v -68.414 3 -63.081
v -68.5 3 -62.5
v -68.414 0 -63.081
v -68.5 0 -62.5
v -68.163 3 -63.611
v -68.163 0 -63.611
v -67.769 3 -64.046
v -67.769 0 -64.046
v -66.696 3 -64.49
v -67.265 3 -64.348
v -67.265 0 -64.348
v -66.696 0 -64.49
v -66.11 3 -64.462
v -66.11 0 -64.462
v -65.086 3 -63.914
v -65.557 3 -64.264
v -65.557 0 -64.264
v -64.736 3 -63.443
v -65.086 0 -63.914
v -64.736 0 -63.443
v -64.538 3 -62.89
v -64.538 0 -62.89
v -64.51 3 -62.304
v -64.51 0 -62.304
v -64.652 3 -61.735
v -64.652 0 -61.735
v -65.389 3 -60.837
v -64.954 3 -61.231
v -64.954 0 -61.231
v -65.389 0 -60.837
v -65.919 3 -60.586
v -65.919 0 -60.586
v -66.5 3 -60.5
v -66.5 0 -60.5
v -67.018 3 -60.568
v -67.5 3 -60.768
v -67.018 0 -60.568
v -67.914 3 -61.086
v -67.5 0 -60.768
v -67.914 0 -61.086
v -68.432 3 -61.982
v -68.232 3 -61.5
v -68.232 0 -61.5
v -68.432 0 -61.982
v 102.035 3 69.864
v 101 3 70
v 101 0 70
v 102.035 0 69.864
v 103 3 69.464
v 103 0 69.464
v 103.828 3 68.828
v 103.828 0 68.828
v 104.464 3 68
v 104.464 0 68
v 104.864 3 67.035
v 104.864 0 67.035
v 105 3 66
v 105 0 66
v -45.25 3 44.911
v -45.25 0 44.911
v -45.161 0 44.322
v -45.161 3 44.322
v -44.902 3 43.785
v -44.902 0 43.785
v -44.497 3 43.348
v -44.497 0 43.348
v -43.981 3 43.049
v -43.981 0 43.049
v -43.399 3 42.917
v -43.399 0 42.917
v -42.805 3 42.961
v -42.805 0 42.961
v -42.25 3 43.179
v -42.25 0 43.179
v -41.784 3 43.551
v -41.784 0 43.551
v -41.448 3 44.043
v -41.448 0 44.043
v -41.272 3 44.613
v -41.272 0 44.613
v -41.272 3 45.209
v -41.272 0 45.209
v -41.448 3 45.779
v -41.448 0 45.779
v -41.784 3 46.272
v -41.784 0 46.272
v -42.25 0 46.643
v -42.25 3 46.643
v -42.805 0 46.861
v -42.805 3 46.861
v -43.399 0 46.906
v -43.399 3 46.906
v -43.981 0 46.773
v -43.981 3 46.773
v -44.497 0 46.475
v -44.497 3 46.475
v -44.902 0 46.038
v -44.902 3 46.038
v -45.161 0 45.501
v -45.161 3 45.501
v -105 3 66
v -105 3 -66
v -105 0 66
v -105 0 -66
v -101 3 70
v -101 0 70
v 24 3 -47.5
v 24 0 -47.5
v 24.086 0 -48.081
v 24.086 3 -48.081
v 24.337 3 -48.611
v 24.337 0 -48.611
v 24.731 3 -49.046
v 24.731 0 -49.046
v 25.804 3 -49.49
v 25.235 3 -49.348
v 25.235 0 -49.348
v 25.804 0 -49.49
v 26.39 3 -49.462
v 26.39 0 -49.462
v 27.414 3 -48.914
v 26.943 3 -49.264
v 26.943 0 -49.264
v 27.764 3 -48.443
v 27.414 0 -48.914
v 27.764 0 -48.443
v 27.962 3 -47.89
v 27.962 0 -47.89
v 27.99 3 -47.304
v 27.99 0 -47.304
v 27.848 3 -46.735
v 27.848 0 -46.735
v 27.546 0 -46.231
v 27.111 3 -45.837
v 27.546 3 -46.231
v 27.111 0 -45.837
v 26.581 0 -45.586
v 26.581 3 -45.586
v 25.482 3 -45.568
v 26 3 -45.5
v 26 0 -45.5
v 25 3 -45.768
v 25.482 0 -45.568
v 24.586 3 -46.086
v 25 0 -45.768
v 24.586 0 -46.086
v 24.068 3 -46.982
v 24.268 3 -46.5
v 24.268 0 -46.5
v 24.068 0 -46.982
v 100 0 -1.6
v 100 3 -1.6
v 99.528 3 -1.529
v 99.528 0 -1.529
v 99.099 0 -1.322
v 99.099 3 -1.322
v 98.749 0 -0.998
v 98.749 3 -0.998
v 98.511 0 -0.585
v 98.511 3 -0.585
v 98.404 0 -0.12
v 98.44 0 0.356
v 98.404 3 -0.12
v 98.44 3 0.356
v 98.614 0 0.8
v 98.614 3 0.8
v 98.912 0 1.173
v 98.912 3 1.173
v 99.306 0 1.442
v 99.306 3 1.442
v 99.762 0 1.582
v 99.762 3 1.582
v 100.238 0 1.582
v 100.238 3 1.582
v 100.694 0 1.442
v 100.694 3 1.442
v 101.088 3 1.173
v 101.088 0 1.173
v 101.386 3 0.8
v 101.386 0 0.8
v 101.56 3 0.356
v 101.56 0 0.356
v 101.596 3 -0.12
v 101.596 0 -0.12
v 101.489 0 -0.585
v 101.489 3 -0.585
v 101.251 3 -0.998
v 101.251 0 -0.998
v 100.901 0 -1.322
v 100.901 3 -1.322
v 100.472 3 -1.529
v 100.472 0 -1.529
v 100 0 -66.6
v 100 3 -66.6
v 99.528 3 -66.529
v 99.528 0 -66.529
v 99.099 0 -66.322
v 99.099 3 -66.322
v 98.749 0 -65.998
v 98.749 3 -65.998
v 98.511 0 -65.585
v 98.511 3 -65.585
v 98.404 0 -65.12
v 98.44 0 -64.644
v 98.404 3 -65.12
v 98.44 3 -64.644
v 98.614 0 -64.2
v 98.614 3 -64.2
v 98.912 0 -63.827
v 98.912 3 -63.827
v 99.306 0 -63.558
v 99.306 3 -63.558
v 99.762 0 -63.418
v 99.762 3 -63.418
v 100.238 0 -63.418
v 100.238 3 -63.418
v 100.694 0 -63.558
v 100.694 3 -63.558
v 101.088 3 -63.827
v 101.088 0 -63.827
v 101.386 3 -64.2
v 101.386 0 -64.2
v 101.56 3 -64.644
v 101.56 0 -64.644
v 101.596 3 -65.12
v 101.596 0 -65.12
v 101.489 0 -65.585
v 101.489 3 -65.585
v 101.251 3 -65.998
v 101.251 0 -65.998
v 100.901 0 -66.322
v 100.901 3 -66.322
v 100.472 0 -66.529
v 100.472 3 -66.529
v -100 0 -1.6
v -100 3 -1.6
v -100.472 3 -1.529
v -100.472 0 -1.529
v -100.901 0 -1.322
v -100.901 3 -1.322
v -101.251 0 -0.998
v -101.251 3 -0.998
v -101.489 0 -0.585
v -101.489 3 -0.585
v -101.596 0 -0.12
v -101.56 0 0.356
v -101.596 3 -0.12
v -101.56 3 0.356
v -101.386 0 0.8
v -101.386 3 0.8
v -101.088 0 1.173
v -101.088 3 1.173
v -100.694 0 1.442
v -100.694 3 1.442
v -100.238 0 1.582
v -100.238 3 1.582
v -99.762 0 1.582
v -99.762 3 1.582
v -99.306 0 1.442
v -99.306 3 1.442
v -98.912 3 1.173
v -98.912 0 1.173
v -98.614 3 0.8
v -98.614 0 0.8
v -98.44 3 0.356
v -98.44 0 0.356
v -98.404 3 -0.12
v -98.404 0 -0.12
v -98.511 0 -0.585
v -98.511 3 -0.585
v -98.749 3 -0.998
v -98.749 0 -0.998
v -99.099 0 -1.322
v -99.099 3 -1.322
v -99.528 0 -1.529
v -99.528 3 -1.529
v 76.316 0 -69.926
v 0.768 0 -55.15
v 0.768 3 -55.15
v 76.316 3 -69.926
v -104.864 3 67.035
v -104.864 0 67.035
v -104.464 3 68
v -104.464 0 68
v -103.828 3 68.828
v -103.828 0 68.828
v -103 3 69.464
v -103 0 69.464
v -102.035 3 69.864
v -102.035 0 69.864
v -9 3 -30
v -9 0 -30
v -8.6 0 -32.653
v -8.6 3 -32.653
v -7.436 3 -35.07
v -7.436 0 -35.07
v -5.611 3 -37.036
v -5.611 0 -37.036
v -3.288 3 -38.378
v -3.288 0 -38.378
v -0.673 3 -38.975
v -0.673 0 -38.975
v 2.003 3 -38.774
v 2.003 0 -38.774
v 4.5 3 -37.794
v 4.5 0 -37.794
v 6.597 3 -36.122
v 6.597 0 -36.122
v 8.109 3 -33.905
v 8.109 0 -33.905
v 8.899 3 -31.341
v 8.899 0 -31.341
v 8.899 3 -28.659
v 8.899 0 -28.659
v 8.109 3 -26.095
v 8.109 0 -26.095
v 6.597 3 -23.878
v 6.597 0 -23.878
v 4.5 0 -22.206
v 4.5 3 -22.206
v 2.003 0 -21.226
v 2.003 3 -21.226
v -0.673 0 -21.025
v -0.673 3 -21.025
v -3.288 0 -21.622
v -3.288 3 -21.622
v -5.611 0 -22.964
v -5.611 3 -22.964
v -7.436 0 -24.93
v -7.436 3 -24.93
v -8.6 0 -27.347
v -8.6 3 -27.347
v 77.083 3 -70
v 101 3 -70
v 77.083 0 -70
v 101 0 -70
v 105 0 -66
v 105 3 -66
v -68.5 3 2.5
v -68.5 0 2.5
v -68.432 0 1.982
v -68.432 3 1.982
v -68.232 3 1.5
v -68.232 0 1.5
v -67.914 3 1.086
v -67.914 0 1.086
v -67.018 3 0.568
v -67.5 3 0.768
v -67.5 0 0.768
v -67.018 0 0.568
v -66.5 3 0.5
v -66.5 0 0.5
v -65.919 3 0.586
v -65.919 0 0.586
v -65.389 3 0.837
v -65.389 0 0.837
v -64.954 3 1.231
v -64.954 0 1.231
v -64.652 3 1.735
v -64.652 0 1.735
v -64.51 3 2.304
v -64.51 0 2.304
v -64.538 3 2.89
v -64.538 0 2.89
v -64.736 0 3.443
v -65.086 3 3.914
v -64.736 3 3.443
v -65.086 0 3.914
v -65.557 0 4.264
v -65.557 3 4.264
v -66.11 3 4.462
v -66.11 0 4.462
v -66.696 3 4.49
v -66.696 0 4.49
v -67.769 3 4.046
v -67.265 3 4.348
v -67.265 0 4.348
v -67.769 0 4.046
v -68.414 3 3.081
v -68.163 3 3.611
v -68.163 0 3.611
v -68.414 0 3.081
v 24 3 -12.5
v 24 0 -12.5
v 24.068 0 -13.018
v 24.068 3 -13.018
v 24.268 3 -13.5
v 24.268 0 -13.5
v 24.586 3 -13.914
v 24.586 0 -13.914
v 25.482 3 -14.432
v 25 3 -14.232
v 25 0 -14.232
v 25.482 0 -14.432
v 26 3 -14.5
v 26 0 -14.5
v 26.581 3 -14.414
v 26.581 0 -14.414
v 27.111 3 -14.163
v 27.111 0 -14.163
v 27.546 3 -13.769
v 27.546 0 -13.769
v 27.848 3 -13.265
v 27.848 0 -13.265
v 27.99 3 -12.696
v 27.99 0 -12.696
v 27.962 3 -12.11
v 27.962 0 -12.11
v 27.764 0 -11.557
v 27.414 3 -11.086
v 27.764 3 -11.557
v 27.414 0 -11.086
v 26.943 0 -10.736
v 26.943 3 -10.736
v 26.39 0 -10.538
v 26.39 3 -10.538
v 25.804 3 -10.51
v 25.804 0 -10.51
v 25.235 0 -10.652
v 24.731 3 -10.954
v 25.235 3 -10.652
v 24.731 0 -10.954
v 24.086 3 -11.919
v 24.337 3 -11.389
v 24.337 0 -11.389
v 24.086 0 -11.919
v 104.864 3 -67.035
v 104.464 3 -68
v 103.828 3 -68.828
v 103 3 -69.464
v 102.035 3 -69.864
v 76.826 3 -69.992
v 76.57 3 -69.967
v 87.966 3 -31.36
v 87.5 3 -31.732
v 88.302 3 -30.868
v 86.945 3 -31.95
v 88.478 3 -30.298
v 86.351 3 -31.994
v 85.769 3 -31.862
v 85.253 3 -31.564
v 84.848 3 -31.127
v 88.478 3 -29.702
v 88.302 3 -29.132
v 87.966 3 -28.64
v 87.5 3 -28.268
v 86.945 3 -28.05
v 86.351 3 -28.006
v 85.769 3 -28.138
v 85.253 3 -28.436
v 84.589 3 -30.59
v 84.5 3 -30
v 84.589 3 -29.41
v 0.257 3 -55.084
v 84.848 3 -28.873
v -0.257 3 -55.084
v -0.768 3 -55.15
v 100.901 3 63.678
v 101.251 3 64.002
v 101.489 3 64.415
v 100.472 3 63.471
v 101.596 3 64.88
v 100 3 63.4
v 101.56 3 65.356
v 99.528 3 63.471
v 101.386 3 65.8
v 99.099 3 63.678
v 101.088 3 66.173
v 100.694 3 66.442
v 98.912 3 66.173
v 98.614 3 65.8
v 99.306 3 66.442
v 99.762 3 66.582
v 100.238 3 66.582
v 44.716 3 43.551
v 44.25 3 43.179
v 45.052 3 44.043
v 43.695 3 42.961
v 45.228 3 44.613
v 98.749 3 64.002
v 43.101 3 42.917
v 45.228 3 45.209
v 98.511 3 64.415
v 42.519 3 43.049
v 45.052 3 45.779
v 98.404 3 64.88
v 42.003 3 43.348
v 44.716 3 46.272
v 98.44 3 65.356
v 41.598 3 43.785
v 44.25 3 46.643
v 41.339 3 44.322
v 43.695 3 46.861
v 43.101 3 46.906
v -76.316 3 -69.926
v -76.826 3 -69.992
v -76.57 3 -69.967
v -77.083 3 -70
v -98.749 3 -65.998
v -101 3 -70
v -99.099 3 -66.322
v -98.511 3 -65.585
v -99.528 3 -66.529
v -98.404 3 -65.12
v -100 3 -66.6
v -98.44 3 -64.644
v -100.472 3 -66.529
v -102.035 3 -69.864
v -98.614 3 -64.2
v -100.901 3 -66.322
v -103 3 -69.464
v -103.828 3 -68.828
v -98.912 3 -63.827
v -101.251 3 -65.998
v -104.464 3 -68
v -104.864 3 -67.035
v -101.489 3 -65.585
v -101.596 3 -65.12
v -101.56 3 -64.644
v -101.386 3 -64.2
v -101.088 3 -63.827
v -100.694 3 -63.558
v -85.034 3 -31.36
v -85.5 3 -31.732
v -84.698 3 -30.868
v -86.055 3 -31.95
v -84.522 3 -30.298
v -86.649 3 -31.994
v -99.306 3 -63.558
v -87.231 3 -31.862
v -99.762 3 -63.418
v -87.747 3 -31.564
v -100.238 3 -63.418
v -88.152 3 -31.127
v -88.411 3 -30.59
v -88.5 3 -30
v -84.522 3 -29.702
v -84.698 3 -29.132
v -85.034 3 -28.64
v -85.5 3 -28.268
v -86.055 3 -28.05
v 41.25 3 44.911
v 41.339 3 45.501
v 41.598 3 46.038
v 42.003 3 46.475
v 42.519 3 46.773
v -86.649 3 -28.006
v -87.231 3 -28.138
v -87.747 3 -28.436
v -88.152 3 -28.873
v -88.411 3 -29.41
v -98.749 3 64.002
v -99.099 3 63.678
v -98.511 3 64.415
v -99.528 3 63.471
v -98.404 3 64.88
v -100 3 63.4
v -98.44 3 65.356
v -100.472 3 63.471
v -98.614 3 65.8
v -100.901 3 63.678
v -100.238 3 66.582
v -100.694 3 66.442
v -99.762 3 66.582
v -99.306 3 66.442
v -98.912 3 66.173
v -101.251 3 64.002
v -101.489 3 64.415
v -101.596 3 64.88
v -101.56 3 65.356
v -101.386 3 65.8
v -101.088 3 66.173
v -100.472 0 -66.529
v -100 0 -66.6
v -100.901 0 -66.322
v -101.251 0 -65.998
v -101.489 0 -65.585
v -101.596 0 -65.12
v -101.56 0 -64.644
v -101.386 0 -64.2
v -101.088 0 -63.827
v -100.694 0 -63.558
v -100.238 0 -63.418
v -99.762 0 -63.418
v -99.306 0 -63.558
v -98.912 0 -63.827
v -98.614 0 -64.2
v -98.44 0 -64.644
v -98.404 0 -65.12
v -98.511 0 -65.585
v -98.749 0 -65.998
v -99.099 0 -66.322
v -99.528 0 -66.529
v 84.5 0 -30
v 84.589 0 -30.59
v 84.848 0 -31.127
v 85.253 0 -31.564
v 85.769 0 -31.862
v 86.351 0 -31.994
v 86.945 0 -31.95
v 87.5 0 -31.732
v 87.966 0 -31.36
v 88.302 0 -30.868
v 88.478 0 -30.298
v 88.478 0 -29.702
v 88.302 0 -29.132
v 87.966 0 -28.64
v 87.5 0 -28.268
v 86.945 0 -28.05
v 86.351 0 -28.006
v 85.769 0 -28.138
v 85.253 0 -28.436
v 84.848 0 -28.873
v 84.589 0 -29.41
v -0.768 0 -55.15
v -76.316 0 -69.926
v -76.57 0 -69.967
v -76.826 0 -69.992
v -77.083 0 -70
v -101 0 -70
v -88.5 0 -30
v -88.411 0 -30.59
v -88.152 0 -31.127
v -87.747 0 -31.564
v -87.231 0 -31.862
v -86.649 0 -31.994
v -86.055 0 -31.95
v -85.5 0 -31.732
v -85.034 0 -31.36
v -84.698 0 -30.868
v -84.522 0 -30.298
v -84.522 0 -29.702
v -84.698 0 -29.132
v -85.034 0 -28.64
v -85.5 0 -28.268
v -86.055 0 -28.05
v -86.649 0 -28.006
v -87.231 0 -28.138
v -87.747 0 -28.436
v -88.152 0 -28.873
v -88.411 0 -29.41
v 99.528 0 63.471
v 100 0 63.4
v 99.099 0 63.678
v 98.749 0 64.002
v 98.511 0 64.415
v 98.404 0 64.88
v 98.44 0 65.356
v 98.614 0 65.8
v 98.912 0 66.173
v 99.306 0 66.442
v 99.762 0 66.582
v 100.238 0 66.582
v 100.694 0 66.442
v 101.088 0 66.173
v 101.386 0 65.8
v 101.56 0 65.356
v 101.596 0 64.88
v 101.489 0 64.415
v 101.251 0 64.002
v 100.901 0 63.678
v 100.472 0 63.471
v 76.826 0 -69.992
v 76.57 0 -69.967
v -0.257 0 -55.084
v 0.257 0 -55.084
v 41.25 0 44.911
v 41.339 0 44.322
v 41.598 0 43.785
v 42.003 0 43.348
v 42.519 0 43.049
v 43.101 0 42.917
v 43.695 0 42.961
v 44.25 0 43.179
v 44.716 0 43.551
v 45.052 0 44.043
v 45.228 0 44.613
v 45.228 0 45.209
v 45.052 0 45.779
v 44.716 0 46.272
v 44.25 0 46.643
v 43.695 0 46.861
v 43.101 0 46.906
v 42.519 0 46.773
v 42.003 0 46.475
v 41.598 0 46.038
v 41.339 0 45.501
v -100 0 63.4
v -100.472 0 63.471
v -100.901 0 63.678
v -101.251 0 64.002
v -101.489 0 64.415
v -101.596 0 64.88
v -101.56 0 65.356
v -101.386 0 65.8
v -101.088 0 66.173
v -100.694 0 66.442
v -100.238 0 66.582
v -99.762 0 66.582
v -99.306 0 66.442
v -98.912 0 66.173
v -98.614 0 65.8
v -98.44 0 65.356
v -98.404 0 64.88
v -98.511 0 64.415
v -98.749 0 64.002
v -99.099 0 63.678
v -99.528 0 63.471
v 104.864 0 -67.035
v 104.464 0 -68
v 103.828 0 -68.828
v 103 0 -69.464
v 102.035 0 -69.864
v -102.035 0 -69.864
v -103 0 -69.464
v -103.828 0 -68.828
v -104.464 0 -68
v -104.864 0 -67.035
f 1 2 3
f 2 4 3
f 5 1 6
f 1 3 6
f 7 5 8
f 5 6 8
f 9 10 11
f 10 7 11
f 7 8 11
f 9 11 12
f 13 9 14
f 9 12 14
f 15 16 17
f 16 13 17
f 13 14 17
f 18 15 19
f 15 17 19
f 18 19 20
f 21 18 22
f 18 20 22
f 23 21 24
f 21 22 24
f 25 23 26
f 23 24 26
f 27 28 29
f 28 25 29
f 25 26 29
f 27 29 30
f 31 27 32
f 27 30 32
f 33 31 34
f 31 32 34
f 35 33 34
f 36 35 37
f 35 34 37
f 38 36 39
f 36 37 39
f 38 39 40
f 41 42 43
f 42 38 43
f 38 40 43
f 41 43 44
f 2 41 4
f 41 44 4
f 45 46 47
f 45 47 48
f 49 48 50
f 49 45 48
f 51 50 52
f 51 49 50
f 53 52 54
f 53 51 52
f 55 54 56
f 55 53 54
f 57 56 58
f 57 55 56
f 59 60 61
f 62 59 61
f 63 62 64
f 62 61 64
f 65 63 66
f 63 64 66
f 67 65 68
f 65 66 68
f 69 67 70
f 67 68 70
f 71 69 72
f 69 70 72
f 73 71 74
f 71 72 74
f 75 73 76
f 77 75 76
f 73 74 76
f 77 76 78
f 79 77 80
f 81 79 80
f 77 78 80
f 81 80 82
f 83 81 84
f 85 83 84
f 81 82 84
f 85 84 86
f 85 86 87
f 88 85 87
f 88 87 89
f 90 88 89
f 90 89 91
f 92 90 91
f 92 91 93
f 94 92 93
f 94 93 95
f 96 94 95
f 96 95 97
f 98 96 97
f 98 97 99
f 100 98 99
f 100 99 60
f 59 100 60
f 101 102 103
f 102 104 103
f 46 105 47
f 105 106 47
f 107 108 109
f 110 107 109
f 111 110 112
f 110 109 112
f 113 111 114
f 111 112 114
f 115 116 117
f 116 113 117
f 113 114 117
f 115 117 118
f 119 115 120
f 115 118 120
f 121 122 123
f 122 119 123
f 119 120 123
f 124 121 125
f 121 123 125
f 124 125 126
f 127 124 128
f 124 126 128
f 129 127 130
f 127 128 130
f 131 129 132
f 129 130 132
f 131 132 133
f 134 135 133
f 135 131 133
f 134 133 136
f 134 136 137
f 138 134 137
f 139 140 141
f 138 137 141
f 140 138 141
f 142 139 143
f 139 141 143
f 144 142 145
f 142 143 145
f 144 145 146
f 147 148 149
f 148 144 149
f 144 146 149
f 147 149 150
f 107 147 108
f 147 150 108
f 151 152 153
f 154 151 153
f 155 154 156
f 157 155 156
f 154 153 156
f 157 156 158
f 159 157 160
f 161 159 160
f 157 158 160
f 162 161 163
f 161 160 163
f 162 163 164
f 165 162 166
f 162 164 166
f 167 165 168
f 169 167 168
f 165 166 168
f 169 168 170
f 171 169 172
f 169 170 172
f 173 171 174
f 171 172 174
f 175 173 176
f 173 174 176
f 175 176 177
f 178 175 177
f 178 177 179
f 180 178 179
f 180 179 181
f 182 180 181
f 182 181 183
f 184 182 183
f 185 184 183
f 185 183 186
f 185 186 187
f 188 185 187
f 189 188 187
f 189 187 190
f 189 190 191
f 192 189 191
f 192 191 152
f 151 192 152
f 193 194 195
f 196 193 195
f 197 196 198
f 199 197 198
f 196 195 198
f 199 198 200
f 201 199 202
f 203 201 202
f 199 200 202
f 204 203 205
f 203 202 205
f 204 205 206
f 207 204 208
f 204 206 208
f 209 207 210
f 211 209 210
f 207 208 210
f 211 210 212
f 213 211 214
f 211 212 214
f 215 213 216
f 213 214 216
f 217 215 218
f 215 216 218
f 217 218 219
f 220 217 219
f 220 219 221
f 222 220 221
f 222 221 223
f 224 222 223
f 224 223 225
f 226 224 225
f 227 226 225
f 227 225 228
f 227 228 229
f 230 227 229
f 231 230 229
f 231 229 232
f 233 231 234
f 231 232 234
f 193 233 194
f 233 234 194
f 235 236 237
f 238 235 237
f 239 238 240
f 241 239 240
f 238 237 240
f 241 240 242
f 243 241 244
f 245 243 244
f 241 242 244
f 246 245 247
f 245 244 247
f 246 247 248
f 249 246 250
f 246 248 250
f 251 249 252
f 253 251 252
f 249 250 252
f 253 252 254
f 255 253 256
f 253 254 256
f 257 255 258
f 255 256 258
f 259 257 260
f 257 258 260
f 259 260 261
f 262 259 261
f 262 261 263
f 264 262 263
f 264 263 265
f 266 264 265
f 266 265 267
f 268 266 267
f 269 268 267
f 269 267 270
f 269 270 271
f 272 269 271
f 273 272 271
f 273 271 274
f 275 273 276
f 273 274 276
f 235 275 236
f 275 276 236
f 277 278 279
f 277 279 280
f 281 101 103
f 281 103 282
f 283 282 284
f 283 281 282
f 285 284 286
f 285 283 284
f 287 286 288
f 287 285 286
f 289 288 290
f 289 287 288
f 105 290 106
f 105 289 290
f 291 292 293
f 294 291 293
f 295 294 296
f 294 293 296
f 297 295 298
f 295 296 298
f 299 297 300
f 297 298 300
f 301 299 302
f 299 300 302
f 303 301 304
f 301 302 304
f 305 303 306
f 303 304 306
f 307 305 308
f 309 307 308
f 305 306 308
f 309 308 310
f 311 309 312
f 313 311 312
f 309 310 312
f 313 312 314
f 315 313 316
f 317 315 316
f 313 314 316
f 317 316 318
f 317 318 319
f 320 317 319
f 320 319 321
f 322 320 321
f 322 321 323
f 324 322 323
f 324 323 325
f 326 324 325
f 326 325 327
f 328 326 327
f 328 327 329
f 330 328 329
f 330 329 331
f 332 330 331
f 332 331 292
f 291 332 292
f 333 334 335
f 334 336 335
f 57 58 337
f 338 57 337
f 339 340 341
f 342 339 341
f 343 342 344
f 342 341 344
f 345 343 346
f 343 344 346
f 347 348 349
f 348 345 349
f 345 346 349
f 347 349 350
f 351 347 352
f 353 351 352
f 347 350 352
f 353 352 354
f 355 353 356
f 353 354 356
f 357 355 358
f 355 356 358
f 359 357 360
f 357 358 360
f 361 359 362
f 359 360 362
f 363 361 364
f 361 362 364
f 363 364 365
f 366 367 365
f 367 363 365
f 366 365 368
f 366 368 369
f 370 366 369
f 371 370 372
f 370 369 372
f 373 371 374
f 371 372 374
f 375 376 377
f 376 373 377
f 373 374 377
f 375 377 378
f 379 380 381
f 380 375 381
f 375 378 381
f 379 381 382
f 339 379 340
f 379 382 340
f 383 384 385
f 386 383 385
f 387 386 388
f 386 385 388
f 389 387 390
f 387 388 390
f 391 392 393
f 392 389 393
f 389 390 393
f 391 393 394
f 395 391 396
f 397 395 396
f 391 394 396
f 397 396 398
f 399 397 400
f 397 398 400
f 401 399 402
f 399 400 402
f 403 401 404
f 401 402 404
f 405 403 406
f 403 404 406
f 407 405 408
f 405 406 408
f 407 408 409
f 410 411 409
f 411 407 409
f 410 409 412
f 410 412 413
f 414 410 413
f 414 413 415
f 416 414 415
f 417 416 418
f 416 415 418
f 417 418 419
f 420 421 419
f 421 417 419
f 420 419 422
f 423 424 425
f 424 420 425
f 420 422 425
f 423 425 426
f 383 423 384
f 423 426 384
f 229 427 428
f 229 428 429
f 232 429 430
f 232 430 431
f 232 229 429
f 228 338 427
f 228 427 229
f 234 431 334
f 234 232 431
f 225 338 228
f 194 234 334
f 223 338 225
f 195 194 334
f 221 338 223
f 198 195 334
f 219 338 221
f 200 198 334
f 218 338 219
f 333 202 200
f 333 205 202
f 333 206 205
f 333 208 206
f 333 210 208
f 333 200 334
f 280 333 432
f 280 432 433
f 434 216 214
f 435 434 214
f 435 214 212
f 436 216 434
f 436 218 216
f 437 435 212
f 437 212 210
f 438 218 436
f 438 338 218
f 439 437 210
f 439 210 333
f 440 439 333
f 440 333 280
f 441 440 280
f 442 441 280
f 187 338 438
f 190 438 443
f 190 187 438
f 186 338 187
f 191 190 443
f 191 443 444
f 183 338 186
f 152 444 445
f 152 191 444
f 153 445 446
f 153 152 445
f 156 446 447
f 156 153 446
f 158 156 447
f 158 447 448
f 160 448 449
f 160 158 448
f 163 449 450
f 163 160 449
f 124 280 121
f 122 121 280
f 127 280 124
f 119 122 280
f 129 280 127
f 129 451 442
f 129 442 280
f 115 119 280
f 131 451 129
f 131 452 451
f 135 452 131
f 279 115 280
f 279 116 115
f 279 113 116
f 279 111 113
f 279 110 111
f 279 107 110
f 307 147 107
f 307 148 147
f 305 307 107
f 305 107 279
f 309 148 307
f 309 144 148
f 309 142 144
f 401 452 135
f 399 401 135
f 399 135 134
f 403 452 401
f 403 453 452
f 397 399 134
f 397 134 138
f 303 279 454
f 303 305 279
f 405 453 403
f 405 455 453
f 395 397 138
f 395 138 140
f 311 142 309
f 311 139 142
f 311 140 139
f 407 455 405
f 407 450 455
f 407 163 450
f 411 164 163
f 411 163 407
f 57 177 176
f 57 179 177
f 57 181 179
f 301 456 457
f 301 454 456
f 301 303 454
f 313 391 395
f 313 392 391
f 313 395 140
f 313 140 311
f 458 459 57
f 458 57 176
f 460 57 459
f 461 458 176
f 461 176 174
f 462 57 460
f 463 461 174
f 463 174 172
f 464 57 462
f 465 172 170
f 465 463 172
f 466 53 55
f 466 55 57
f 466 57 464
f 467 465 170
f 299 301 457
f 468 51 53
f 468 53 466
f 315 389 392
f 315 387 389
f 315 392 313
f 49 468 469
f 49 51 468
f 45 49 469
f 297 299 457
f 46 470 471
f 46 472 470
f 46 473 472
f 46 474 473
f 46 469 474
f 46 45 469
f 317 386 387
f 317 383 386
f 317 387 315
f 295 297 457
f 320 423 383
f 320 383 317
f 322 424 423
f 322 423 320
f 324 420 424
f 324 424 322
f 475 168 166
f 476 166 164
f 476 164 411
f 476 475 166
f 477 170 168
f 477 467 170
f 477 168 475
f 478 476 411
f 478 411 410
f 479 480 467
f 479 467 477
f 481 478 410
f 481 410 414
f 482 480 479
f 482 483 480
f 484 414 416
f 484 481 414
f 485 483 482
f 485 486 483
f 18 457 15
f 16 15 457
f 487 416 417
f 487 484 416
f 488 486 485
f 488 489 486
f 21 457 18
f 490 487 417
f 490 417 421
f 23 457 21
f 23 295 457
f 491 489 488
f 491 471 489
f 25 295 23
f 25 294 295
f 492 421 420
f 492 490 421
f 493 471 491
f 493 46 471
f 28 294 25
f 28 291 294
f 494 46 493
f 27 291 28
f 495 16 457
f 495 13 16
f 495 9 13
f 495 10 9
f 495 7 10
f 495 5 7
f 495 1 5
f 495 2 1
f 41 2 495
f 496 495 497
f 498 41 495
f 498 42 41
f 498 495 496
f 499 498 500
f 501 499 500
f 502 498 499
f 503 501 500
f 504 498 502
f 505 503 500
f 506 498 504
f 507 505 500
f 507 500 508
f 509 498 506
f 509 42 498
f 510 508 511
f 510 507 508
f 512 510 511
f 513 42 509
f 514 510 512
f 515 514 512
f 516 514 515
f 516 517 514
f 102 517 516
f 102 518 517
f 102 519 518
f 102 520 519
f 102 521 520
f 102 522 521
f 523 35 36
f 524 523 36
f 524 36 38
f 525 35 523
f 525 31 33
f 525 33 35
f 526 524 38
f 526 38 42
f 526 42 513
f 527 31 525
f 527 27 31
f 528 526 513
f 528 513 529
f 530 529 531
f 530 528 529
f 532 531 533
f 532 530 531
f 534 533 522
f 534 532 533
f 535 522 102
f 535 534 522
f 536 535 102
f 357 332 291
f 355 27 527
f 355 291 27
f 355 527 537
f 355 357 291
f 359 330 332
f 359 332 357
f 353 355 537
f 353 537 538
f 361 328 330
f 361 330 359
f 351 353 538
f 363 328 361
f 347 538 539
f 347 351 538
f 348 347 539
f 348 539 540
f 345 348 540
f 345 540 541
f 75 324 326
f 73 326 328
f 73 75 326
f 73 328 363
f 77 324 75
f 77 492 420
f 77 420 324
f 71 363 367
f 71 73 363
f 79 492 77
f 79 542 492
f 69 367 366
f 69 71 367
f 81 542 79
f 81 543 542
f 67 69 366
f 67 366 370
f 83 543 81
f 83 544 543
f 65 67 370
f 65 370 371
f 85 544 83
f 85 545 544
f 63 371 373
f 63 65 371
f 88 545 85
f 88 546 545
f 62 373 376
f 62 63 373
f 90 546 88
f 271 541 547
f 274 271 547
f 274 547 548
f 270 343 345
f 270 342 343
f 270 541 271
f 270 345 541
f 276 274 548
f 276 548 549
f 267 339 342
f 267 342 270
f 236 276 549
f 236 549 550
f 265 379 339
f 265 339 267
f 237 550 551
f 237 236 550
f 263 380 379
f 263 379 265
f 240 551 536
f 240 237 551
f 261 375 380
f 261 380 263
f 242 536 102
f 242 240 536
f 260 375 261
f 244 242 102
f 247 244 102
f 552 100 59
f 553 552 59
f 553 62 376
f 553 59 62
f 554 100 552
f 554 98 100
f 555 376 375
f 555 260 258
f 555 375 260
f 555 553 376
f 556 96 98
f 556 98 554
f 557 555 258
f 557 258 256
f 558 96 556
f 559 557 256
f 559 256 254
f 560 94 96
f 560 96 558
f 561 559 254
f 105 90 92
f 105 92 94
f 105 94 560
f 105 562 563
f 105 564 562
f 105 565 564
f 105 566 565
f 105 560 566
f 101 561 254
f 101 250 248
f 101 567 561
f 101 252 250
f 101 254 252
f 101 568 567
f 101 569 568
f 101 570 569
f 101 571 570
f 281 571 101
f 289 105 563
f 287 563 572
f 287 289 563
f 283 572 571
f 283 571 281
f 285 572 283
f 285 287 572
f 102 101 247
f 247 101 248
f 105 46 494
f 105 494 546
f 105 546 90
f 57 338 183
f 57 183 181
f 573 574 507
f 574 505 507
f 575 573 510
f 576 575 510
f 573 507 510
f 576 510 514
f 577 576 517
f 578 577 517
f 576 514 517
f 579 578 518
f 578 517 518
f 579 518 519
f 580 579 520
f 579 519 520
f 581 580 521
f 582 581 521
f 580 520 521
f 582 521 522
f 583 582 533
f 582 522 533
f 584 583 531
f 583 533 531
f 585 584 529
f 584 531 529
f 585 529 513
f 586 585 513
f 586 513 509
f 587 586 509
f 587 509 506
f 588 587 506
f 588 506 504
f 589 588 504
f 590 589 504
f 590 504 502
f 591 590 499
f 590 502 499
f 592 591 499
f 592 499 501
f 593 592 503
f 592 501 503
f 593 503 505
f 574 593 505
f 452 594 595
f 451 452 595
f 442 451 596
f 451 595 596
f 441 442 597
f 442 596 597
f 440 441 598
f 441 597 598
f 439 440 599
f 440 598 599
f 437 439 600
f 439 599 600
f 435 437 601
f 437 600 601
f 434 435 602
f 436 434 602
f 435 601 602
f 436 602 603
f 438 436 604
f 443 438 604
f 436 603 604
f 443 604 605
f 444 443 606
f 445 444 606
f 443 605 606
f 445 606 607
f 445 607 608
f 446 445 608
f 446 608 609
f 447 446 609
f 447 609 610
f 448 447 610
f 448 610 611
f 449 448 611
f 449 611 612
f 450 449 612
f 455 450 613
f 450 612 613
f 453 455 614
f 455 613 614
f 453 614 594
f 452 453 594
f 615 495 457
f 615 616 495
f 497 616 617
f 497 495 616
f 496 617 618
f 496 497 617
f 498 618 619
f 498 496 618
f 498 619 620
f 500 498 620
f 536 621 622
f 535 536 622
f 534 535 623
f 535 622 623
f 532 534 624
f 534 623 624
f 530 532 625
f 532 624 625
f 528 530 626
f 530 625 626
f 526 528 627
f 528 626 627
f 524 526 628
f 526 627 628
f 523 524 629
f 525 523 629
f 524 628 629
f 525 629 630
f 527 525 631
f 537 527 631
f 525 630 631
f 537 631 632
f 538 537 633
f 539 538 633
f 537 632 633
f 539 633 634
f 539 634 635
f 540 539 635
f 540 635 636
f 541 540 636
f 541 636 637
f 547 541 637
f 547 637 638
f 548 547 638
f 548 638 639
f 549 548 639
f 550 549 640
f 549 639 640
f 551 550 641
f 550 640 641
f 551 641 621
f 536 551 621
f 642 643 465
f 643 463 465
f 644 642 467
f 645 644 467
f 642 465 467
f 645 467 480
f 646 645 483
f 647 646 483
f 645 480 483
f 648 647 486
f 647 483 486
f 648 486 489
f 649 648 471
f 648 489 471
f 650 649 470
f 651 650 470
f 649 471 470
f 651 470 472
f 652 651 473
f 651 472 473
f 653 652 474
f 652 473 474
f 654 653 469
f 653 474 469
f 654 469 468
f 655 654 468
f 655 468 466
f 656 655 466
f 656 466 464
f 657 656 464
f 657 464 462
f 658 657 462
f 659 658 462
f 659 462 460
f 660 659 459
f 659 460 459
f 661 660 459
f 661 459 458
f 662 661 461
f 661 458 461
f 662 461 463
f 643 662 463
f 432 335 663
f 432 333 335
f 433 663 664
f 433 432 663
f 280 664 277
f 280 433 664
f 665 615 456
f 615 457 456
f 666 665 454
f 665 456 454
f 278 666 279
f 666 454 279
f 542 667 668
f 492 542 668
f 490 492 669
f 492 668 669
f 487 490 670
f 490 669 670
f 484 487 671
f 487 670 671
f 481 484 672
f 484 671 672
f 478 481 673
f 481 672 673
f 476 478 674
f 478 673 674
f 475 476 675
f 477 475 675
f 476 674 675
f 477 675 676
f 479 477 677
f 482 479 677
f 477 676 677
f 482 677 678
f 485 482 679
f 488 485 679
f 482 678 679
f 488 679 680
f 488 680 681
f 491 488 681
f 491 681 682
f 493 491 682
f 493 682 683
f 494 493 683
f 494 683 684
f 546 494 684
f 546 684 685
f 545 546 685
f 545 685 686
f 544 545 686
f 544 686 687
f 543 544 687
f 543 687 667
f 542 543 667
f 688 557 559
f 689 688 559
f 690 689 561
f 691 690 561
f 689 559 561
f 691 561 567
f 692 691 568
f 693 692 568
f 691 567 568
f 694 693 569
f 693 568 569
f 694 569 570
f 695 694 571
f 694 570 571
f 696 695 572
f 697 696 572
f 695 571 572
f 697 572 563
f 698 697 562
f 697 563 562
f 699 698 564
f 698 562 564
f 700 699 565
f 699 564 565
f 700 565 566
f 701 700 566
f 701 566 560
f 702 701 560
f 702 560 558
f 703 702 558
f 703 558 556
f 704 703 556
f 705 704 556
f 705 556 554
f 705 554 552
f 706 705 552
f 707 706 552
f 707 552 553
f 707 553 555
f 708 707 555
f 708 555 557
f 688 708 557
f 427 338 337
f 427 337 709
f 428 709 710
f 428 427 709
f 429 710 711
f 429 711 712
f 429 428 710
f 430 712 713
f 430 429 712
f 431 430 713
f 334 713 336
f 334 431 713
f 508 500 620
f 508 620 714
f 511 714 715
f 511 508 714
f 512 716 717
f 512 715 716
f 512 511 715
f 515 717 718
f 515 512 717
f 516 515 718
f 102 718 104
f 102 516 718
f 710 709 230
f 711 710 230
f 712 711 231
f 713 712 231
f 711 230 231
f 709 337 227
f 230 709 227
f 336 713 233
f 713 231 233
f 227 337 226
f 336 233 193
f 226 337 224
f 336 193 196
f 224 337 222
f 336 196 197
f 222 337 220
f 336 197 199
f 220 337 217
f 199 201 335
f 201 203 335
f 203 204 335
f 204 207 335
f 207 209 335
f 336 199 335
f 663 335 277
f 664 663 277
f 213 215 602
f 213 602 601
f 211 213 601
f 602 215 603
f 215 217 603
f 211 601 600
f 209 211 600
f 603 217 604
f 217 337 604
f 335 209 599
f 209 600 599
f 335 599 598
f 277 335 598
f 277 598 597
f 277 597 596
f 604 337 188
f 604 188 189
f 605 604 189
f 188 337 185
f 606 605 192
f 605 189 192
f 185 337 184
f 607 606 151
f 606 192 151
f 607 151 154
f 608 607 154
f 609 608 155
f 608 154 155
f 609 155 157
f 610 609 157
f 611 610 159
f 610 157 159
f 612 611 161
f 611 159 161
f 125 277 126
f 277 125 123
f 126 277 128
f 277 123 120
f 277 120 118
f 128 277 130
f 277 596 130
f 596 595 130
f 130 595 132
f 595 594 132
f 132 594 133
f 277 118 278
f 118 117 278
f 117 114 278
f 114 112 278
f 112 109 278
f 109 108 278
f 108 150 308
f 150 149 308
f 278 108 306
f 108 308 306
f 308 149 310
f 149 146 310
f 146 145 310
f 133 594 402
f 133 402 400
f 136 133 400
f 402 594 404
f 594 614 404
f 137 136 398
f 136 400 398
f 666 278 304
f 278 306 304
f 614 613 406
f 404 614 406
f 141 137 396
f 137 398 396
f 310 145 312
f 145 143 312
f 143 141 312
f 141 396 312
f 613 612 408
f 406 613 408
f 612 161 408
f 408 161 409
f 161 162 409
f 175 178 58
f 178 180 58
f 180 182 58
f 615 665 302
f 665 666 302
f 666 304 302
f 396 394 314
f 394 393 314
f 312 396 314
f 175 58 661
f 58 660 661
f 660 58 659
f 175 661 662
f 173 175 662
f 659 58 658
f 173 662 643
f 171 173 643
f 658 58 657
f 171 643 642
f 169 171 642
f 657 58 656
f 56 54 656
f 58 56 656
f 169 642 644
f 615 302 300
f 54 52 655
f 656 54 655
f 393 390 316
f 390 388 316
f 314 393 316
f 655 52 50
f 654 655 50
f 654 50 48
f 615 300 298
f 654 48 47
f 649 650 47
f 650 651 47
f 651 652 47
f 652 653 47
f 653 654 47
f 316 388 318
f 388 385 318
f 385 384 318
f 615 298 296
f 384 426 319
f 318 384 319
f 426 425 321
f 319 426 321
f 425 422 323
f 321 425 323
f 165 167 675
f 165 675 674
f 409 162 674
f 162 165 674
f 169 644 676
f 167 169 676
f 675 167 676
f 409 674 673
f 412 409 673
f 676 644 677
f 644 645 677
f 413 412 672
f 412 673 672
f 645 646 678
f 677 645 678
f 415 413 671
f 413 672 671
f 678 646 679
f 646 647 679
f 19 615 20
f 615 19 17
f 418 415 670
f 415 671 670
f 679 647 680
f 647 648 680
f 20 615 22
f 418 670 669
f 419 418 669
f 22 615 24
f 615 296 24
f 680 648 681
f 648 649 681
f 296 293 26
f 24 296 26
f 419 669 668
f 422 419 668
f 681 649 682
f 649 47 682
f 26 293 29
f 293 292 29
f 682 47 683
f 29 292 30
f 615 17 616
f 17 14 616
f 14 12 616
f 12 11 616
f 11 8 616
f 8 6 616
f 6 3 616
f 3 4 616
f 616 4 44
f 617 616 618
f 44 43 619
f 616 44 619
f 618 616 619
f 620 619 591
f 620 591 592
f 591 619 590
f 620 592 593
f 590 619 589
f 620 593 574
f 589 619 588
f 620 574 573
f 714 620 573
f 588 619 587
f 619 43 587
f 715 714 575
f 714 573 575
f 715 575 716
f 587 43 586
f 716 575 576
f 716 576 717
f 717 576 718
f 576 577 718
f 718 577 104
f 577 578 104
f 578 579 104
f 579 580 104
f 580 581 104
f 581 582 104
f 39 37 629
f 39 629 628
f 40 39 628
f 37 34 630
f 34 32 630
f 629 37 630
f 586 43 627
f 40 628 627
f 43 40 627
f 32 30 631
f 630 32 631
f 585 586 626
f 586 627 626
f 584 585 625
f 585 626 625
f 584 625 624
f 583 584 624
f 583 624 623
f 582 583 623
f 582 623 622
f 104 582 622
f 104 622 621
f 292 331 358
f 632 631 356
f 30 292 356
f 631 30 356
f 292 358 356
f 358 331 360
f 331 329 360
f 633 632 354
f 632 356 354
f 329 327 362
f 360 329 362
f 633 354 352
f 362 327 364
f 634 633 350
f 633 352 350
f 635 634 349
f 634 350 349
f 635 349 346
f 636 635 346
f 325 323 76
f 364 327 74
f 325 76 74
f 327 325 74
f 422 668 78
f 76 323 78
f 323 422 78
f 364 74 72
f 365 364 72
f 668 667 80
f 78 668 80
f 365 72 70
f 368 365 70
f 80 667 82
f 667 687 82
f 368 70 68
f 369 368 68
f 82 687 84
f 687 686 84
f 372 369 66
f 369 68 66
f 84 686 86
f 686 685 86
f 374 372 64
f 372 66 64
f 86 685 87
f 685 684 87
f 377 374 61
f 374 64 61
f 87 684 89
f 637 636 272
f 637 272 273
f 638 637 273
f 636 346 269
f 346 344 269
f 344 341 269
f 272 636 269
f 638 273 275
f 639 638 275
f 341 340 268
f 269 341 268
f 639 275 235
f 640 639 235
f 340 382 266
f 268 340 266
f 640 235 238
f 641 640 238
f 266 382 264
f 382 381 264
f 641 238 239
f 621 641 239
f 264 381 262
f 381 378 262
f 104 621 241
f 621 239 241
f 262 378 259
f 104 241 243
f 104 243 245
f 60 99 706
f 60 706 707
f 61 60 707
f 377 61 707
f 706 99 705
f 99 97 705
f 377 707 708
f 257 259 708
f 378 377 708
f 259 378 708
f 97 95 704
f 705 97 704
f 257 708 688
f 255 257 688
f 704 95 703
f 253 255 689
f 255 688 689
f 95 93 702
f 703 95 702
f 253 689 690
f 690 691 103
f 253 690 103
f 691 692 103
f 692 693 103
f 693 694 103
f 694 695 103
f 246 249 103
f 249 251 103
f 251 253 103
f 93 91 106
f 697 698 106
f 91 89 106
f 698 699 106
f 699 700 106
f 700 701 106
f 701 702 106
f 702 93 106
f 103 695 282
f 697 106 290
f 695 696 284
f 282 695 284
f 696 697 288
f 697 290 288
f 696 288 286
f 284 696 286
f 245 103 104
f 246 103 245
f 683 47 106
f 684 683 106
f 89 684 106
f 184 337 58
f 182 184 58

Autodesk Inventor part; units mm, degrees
ref_plane "YZ Plane" through (0, 0, 0) normal (1, 0, 0) x (0, 1, 0)
ref_plane "XZ Plane" through (0, 0, 0) normal (0, 1, 0) x (-1, 0, 0)
ref_plane "XY Plane" through (0, 0, 0) normal (0, 0, 1) x (1, 0, 0)
sketch "スケッチ1" plane through (0, 0, 0) normal (0, 1, 0) x (-1, 0, 0)
  line L0 (105, 70) -> (-105, 70)
  line L1 (-105, 70) -> (-105, -70)
  line L2 (-105, -70) -> (105, -70)
  line L3 (105, -70) -> (105, 70)
  line L4 (105, 70) -> (-105, -70) construction
  line L5 (-105, 70) -> (105, -70) construction
  circle A0 centre (0, -30) radius 77
  circle A1 centre (0, -30) radius 9
  line L6 (-105, -30) -> (105, -30)
  circle A2 centre (48, -30) radius 12.5
  circle A3 centre (-39, -30) radius 6
  circle A4 centre (48, -30) radius 17.5
  circle A5 centre (-39, -30) radius 9
  circle A6 centre (0, -30) radius 86.5
  line L7 (66.5, -30) -> (66.5, -62.5)
  line L8 (66.5, -30) -> (66.5, 2.5)
  line L9 (-26, -30) -> (-26, -47.5)
  line L10 (-26, -30) -> (-26, -12.5)
  circle A7 centre (65.5, -30) radius 2
  circle A8 centre (48, -12.5) radius 2
  circle A9 centre (30.5, -30) radius 2
  circle A10 centre (48, -47.5) radius 2
  circle A11 centre (-39, -39) radius 1.6
  circle A12 centre (-39, -21) radius 1.6
  circle A13 centre (-26, -47.5) radius 2
  circle A14 centre (-26, -12.5) radius 2
  circle A15 centre (66.5, -62.5) radius 2
  circle A16 centre (66.5, 2.5) radius 2
  circle A17 centre (86.5, -30) radius 2
  circle A18 centre (43.25, 44.9112) radius 2
  circle A19 centre (-43.25, 44.9112) radius 2
  circle A20 centre (-86.5, -30) radius 2
  line L11 (76.6958, -70) -> (0, -55)
  line L12 (0, -55) -> (-76.6958, -70)
  line L13 (100, -70) -> (100, 70)
  line L14 (-100, -70) -> (-100, 70)
  point P0 (0, 0)
  point P1 (-43.25, -104.9112)
  point P2 (43.25, -104.9112)
  point P3 (100, -65)
  point P4 (100, 0)
  point P5 (100, 65)
  point P6 (-100, -65)
  point P7 (-100, 0)
  point P8 (-100, 65)
  dimension "d9" = 35
  dimension "d0" = 210
  dimension "d1" = 140
  dimension "d2" = 100
  dimension "d3" = 154
  dimension "d4" = 18
  dimension "d5" = 48
  dimension "d6" = 39
  dimension "d7" = 25
  dimension "d8" = 12
  dimension "d10" = 18
  dimension "d11" = 173
  dimension "d14" = 360
  dimension "d16" = 18.5
  dimension "d17" = 32.5
  dimension "d18" = 32.5
  dimension "d20" = 13
  dimension "d21" = 17.5
  dimension "d22" = 17.5
  dimension "d25" = 360
  dimension "d27" = 4
  dimension "d28" = 4
  dimension "d29" = 4
  dimension "d30" = 4
  dimension "d31" = 3.2
  dimension "d32" = 3.2
  dimension "d33" = 4
  dimension "d34" = 4
  dimension "d35" = 4
  dimension "d36" = 4
  dimension "d37" = 4
  dimension "d38" = 4
  dimension "d39" = 4
  dimension "d40" = 4
  dimension "d41" = 15
  dimension "d45" = 5
  dimension "d46" = 5
  dimension "d47" = 5
  dimension "d48" = 5
  dimension "d49" = 5
  dimension "d50" = 5
  dimension "d51" = 5
  dimension "d52" = 5
extrude "押し出し1" add sketch "スケッチ1" along normal blind 3 contours L3 L6 L13 L0 | L13 L6 A17 A6 A18 A19 A20 L14 L0 | L3 L2 L13 L6 | L14 L6 L1 L0 | L13 L2 A6 A17 L6 | L14 L2 L1 L6 | L6 A20 A6 L2 L14 | A17 L6 A0 A20 A6 A19 A18 | A6 L11 A0 L6 A17 | A20 L6 A0 L12 A6 | L11 L12 A0 L6 A5 A11 A1 A9 A4 A10 A7 | L6 A7 A4 A8 A9 A1 A5 A12 A0 | A7 L7 L6 | L6 L8 A7 | A5 A12 L6 A3 | L6 A3 A5 A11 | L7 A7 A4 L6 | L6 A4 A7 L8 | A3 L6 | L6 A3 | A12 A5 | A5 A12 | A11 A5 | A5 A11 | A4 A7 L6 | L6 A7 A4 | A7 L6 A2 A9 A4 A8 | A4 A10 A9 L6 A2 A7 | A8 A4 | A4 A8 | A10 A4 | A4 A10 | A2 L6 | L6 A2 | A9 L6 A4 | A4 L6 A9 | A9 L6 A4 | A4 L6 A9
fillet "フィレット1" radius 4 7 edges at (-105, 1.5, 70) (-105, 1.5, -70) (-76.6958, 1.5, -70) (0, 1.5, -55) (76.6958, 1.5, -70) (105, 1.5, -70) (105, 1.5, 70)
hole "穴1" at (-100, 0, 65) at (-100, 0, 0) at (-100, 0, -65) at (100, 0, -65) at (100, 0, 0) at (100, 0, 65) direction (0, 1, 0) diameter 3.2 end through all
sketch "スケッチ3" plane through (0, 3, 0) normal (0, 1, 0) x (1, 0, 0)
  circle A0 centre (100, -65) radius 1.6 projected
  circle A1 centre (100, 0) radius 1.6 projected
  circle A2 centre (100, 65) radius 1.6 projected
  circle A3 centre (-100, 65) radius 1.6 projected
  circle A4 centre (-100, 0) radius 1.6 projected
  circle A5 centre (-100, -65) radius 1.6 projected
  arc A6 (101, -70) -> (105, -66) centre (101, -66) ccw projected
  line L0 (105, -66) -> (105, 66) projected
  arc A7 (105, 66) -> (101, 70) centre (101, 66) ccw projected
  line L1 (101, 70) -> (77.0833, 70) projected
  arc A8 (77.0833, 70) -> (76.3155, 69.9256) centre (77.0833, 66) ccw projected
  line L2 (76.3155, 69.9256) -> (0.7678, 55.1502) projected
  arc A9 (-0.7678, 55.1502) -> (0.7678, 55.1502) centre (0, 59.0758) ccw projected
  line L3 (-0.7678, 55.1502) -> (-76.3155, 69.9256) projected
  arc A10 (-76.3155, 69.9256) -> (-77.0833, 70) centre (-77.0833, 66) ccw projected
  line L4 (-77.0833, 70) -> (-101, 70) projected
  arc A11 (-101, 70) -> (-105, 66) centre (-101, 66) ccw projected
  line L5 (-105, 66) -> (-105, -66) projected
  arc A12 (-105, -66) -> (-101, -70) centre (-101, -66) ccw projected
  line L6 (-101, -70) -> (101, -70) projected
  circle A13 centre (43.25, -44.9112) radius 2 projected
  circle A14 centre (-43.25, -44.9112) radius 2 projected
  circle A15 centre (-86.5, 30) radius 2 projected
  circle A16 centre (-66.5, 62.5) radius 2 projected
  circle A17 centre (-66.5, -2.5) radius 2 projected
  circle A18 centre (0, 30) radius 9 projected
  circle A19 centre (26, 47.5) radius 2 projected
  circle A20 centre (26, 12.5) radius 2 projected
  circle A21 centre (86.5, 30) radius 2 projected
  point P0 (0, 0)
properties part number "ローラー_板"
